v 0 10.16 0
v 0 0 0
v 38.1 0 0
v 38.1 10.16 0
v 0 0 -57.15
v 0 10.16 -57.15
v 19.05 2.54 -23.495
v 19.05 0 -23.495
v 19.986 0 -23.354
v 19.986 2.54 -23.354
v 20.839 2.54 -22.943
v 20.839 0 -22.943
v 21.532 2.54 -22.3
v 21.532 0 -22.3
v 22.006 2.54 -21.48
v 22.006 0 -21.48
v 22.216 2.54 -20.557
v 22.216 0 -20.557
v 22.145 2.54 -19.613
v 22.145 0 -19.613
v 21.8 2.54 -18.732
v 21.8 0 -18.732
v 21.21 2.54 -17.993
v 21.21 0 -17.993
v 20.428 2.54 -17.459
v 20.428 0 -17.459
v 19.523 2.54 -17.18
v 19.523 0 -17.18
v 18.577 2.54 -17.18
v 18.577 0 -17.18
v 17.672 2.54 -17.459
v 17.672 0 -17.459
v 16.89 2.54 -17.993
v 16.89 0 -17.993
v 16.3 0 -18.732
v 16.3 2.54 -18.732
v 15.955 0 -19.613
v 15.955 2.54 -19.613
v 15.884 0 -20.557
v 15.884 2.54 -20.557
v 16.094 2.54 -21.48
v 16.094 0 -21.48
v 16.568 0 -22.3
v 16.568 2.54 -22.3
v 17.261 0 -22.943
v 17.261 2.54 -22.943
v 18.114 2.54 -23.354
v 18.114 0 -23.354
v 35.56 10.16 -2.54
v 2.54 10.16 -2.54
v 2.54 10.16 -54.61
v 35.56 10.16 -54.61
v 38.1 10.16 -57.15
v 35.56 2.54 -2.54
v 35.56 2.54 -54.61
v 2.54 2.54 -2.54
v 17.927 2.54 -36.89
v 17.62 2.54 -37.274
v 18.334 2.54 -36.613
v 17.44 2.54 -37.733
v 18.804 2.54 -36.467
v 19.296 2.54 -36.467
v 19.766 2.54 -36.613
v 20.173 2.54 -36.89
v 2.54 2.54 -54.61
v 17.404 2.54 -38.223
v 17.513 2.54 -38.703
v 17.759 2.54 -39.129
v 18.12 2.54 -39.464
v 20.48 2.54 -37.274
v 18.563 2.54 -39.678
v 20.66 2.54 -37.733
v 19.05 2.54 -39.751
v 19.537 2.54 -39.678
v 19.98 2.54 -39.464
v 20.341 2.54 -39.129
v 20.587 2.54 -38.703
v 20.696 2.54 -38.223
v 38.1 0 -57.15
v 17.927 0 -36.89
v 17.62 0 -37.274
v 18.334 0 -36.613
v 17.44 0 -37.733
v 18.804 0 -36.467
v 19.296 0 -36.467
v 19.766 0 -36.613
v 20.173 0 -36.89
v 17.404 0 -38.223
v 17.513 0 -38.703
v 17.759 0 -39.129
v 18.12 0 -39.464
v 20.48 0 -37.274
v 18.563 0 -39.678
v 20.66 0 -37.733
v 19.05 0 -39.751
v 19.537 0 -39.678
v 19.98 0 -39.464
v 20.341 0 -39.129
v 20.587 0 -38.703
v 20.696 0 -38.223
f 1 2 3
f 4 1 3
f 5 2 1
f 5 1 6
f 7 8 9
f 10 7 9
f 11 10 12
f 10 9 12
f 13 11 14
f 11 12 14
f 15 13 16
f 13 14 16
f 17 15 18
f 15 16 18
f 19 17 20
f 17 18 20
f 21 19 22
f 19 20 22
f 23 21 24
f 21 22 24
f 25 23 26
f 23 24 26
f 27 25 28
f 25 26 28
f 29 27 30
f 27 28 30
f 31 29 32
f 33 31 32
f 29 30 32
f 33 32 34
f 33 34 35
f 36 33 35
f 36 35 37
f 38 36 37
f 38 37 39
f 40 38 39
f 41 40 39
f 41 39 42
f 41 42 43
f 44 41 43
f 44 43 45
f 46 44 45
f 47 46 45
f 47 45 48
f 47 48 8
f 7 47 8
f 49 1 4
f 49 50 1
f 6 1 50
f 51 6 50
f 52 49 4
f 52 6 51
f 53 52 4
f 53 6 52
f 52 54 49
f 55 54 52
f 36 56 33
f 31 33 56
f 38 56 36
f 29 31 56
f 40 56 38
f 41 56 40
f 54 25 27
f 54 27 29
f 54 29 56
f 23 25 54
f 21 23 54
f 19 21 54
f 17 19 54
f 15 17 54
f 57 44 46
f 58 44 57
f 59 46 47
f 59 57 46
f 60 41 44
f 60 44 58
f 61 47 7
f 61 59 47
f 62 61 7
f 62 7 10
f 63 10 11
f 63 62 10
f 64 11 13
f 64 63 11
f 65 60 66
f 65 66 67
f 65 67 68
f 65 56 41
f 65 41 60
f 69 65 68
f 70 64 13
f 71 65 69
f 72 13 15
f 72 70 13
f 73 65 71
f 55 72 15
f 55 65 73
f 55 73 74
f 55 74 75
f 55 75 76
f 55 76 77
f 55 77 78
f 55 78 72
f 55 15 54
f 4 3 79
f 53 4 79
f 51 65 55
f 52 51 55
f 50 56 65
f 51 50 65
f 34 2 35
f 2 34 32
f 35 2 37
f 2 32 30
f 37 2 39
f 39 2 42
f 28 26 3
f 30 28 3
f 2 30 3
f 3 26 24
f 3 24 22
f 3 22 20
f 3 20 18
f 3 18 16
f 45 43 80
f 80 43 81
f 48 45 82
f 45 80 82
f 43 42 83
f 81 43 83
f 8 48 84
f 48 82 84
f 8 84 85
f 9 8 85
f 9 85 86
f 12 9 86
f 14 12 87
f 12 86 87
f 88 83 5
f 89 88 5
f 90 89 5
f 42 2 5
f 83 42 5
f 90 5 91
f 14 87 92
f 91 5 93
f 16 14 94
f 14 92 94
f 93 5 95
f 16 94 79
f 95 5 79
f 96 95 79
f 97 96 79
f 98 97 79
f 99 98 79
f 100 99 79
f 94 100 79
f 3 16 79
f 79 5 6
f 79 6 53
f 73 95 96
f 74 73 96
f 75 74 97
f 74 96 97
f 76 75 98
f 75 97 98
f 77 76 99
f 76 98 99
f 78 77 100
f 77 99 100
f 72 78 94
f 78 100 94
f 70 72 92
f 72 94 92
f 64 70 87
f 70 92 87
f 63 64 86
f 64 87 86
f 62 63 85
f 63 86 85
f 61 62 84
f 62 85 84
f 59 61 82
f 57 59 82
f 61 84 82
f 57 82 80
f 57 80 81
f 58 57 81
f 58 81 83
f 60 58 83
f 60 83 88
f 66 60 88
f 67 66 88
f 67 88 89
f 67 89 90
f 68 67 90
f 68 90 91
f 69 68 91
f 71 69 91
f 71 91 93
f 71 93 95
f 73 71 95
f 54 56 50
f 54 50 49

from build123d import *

# Parameters (mm, degrees)
SKETCH1_W           = 38.1
SKETCH1_H           = 57.15
BOSS_EXTRUDE1_DEPTH = 10.16
SHELL1_T            = -2.54
SKETCH3_R           = 1.651
SKETCH3_R_2         = 3.175
CUT_EXTRUDE1_DEPTH  = 27.94


with BuildPart() as part:
    # Sketch1 → Boss-Extrude1 (new body)
    with BuildSketch(Plane(origin=(0, 0, 0), x_dir=(1, 0, 0), z_dir=(0, 1, 0))):
        with Locations((19.05, 28.575)):
            Rectangle(SKETCH1_W, SKETCH1_H)
    extrude(amount=BOSS_EXTRUDE1_DEPTH)

    # Shell1
    shell1_openings = [part.faces().sort_by_distance(p)[0] for p in [
        (19.05, 10.16, -28.575),
    ]]
    offset(amount=SHELL1_T, openings=shell1_openings, kind=Kind.INTERSECTION)

    # Sketch3 → Cut-Extrude1 (cut)
    with BuildSketch(Plane.XZ):
        with Locations(Location((19.05, -38.1, 0), (0, 0, 270))):
            Circle(SKETCH3_R)
        with Locations(Location((19.05, -20.32, 0), (0, 0, 270))):
            Circle(SKETCH3_R_2)
    extrude(amount=-CUT_EXTRUDE1_DEPTH, mode=Mode.SUBTRACT)


solid = part.part
